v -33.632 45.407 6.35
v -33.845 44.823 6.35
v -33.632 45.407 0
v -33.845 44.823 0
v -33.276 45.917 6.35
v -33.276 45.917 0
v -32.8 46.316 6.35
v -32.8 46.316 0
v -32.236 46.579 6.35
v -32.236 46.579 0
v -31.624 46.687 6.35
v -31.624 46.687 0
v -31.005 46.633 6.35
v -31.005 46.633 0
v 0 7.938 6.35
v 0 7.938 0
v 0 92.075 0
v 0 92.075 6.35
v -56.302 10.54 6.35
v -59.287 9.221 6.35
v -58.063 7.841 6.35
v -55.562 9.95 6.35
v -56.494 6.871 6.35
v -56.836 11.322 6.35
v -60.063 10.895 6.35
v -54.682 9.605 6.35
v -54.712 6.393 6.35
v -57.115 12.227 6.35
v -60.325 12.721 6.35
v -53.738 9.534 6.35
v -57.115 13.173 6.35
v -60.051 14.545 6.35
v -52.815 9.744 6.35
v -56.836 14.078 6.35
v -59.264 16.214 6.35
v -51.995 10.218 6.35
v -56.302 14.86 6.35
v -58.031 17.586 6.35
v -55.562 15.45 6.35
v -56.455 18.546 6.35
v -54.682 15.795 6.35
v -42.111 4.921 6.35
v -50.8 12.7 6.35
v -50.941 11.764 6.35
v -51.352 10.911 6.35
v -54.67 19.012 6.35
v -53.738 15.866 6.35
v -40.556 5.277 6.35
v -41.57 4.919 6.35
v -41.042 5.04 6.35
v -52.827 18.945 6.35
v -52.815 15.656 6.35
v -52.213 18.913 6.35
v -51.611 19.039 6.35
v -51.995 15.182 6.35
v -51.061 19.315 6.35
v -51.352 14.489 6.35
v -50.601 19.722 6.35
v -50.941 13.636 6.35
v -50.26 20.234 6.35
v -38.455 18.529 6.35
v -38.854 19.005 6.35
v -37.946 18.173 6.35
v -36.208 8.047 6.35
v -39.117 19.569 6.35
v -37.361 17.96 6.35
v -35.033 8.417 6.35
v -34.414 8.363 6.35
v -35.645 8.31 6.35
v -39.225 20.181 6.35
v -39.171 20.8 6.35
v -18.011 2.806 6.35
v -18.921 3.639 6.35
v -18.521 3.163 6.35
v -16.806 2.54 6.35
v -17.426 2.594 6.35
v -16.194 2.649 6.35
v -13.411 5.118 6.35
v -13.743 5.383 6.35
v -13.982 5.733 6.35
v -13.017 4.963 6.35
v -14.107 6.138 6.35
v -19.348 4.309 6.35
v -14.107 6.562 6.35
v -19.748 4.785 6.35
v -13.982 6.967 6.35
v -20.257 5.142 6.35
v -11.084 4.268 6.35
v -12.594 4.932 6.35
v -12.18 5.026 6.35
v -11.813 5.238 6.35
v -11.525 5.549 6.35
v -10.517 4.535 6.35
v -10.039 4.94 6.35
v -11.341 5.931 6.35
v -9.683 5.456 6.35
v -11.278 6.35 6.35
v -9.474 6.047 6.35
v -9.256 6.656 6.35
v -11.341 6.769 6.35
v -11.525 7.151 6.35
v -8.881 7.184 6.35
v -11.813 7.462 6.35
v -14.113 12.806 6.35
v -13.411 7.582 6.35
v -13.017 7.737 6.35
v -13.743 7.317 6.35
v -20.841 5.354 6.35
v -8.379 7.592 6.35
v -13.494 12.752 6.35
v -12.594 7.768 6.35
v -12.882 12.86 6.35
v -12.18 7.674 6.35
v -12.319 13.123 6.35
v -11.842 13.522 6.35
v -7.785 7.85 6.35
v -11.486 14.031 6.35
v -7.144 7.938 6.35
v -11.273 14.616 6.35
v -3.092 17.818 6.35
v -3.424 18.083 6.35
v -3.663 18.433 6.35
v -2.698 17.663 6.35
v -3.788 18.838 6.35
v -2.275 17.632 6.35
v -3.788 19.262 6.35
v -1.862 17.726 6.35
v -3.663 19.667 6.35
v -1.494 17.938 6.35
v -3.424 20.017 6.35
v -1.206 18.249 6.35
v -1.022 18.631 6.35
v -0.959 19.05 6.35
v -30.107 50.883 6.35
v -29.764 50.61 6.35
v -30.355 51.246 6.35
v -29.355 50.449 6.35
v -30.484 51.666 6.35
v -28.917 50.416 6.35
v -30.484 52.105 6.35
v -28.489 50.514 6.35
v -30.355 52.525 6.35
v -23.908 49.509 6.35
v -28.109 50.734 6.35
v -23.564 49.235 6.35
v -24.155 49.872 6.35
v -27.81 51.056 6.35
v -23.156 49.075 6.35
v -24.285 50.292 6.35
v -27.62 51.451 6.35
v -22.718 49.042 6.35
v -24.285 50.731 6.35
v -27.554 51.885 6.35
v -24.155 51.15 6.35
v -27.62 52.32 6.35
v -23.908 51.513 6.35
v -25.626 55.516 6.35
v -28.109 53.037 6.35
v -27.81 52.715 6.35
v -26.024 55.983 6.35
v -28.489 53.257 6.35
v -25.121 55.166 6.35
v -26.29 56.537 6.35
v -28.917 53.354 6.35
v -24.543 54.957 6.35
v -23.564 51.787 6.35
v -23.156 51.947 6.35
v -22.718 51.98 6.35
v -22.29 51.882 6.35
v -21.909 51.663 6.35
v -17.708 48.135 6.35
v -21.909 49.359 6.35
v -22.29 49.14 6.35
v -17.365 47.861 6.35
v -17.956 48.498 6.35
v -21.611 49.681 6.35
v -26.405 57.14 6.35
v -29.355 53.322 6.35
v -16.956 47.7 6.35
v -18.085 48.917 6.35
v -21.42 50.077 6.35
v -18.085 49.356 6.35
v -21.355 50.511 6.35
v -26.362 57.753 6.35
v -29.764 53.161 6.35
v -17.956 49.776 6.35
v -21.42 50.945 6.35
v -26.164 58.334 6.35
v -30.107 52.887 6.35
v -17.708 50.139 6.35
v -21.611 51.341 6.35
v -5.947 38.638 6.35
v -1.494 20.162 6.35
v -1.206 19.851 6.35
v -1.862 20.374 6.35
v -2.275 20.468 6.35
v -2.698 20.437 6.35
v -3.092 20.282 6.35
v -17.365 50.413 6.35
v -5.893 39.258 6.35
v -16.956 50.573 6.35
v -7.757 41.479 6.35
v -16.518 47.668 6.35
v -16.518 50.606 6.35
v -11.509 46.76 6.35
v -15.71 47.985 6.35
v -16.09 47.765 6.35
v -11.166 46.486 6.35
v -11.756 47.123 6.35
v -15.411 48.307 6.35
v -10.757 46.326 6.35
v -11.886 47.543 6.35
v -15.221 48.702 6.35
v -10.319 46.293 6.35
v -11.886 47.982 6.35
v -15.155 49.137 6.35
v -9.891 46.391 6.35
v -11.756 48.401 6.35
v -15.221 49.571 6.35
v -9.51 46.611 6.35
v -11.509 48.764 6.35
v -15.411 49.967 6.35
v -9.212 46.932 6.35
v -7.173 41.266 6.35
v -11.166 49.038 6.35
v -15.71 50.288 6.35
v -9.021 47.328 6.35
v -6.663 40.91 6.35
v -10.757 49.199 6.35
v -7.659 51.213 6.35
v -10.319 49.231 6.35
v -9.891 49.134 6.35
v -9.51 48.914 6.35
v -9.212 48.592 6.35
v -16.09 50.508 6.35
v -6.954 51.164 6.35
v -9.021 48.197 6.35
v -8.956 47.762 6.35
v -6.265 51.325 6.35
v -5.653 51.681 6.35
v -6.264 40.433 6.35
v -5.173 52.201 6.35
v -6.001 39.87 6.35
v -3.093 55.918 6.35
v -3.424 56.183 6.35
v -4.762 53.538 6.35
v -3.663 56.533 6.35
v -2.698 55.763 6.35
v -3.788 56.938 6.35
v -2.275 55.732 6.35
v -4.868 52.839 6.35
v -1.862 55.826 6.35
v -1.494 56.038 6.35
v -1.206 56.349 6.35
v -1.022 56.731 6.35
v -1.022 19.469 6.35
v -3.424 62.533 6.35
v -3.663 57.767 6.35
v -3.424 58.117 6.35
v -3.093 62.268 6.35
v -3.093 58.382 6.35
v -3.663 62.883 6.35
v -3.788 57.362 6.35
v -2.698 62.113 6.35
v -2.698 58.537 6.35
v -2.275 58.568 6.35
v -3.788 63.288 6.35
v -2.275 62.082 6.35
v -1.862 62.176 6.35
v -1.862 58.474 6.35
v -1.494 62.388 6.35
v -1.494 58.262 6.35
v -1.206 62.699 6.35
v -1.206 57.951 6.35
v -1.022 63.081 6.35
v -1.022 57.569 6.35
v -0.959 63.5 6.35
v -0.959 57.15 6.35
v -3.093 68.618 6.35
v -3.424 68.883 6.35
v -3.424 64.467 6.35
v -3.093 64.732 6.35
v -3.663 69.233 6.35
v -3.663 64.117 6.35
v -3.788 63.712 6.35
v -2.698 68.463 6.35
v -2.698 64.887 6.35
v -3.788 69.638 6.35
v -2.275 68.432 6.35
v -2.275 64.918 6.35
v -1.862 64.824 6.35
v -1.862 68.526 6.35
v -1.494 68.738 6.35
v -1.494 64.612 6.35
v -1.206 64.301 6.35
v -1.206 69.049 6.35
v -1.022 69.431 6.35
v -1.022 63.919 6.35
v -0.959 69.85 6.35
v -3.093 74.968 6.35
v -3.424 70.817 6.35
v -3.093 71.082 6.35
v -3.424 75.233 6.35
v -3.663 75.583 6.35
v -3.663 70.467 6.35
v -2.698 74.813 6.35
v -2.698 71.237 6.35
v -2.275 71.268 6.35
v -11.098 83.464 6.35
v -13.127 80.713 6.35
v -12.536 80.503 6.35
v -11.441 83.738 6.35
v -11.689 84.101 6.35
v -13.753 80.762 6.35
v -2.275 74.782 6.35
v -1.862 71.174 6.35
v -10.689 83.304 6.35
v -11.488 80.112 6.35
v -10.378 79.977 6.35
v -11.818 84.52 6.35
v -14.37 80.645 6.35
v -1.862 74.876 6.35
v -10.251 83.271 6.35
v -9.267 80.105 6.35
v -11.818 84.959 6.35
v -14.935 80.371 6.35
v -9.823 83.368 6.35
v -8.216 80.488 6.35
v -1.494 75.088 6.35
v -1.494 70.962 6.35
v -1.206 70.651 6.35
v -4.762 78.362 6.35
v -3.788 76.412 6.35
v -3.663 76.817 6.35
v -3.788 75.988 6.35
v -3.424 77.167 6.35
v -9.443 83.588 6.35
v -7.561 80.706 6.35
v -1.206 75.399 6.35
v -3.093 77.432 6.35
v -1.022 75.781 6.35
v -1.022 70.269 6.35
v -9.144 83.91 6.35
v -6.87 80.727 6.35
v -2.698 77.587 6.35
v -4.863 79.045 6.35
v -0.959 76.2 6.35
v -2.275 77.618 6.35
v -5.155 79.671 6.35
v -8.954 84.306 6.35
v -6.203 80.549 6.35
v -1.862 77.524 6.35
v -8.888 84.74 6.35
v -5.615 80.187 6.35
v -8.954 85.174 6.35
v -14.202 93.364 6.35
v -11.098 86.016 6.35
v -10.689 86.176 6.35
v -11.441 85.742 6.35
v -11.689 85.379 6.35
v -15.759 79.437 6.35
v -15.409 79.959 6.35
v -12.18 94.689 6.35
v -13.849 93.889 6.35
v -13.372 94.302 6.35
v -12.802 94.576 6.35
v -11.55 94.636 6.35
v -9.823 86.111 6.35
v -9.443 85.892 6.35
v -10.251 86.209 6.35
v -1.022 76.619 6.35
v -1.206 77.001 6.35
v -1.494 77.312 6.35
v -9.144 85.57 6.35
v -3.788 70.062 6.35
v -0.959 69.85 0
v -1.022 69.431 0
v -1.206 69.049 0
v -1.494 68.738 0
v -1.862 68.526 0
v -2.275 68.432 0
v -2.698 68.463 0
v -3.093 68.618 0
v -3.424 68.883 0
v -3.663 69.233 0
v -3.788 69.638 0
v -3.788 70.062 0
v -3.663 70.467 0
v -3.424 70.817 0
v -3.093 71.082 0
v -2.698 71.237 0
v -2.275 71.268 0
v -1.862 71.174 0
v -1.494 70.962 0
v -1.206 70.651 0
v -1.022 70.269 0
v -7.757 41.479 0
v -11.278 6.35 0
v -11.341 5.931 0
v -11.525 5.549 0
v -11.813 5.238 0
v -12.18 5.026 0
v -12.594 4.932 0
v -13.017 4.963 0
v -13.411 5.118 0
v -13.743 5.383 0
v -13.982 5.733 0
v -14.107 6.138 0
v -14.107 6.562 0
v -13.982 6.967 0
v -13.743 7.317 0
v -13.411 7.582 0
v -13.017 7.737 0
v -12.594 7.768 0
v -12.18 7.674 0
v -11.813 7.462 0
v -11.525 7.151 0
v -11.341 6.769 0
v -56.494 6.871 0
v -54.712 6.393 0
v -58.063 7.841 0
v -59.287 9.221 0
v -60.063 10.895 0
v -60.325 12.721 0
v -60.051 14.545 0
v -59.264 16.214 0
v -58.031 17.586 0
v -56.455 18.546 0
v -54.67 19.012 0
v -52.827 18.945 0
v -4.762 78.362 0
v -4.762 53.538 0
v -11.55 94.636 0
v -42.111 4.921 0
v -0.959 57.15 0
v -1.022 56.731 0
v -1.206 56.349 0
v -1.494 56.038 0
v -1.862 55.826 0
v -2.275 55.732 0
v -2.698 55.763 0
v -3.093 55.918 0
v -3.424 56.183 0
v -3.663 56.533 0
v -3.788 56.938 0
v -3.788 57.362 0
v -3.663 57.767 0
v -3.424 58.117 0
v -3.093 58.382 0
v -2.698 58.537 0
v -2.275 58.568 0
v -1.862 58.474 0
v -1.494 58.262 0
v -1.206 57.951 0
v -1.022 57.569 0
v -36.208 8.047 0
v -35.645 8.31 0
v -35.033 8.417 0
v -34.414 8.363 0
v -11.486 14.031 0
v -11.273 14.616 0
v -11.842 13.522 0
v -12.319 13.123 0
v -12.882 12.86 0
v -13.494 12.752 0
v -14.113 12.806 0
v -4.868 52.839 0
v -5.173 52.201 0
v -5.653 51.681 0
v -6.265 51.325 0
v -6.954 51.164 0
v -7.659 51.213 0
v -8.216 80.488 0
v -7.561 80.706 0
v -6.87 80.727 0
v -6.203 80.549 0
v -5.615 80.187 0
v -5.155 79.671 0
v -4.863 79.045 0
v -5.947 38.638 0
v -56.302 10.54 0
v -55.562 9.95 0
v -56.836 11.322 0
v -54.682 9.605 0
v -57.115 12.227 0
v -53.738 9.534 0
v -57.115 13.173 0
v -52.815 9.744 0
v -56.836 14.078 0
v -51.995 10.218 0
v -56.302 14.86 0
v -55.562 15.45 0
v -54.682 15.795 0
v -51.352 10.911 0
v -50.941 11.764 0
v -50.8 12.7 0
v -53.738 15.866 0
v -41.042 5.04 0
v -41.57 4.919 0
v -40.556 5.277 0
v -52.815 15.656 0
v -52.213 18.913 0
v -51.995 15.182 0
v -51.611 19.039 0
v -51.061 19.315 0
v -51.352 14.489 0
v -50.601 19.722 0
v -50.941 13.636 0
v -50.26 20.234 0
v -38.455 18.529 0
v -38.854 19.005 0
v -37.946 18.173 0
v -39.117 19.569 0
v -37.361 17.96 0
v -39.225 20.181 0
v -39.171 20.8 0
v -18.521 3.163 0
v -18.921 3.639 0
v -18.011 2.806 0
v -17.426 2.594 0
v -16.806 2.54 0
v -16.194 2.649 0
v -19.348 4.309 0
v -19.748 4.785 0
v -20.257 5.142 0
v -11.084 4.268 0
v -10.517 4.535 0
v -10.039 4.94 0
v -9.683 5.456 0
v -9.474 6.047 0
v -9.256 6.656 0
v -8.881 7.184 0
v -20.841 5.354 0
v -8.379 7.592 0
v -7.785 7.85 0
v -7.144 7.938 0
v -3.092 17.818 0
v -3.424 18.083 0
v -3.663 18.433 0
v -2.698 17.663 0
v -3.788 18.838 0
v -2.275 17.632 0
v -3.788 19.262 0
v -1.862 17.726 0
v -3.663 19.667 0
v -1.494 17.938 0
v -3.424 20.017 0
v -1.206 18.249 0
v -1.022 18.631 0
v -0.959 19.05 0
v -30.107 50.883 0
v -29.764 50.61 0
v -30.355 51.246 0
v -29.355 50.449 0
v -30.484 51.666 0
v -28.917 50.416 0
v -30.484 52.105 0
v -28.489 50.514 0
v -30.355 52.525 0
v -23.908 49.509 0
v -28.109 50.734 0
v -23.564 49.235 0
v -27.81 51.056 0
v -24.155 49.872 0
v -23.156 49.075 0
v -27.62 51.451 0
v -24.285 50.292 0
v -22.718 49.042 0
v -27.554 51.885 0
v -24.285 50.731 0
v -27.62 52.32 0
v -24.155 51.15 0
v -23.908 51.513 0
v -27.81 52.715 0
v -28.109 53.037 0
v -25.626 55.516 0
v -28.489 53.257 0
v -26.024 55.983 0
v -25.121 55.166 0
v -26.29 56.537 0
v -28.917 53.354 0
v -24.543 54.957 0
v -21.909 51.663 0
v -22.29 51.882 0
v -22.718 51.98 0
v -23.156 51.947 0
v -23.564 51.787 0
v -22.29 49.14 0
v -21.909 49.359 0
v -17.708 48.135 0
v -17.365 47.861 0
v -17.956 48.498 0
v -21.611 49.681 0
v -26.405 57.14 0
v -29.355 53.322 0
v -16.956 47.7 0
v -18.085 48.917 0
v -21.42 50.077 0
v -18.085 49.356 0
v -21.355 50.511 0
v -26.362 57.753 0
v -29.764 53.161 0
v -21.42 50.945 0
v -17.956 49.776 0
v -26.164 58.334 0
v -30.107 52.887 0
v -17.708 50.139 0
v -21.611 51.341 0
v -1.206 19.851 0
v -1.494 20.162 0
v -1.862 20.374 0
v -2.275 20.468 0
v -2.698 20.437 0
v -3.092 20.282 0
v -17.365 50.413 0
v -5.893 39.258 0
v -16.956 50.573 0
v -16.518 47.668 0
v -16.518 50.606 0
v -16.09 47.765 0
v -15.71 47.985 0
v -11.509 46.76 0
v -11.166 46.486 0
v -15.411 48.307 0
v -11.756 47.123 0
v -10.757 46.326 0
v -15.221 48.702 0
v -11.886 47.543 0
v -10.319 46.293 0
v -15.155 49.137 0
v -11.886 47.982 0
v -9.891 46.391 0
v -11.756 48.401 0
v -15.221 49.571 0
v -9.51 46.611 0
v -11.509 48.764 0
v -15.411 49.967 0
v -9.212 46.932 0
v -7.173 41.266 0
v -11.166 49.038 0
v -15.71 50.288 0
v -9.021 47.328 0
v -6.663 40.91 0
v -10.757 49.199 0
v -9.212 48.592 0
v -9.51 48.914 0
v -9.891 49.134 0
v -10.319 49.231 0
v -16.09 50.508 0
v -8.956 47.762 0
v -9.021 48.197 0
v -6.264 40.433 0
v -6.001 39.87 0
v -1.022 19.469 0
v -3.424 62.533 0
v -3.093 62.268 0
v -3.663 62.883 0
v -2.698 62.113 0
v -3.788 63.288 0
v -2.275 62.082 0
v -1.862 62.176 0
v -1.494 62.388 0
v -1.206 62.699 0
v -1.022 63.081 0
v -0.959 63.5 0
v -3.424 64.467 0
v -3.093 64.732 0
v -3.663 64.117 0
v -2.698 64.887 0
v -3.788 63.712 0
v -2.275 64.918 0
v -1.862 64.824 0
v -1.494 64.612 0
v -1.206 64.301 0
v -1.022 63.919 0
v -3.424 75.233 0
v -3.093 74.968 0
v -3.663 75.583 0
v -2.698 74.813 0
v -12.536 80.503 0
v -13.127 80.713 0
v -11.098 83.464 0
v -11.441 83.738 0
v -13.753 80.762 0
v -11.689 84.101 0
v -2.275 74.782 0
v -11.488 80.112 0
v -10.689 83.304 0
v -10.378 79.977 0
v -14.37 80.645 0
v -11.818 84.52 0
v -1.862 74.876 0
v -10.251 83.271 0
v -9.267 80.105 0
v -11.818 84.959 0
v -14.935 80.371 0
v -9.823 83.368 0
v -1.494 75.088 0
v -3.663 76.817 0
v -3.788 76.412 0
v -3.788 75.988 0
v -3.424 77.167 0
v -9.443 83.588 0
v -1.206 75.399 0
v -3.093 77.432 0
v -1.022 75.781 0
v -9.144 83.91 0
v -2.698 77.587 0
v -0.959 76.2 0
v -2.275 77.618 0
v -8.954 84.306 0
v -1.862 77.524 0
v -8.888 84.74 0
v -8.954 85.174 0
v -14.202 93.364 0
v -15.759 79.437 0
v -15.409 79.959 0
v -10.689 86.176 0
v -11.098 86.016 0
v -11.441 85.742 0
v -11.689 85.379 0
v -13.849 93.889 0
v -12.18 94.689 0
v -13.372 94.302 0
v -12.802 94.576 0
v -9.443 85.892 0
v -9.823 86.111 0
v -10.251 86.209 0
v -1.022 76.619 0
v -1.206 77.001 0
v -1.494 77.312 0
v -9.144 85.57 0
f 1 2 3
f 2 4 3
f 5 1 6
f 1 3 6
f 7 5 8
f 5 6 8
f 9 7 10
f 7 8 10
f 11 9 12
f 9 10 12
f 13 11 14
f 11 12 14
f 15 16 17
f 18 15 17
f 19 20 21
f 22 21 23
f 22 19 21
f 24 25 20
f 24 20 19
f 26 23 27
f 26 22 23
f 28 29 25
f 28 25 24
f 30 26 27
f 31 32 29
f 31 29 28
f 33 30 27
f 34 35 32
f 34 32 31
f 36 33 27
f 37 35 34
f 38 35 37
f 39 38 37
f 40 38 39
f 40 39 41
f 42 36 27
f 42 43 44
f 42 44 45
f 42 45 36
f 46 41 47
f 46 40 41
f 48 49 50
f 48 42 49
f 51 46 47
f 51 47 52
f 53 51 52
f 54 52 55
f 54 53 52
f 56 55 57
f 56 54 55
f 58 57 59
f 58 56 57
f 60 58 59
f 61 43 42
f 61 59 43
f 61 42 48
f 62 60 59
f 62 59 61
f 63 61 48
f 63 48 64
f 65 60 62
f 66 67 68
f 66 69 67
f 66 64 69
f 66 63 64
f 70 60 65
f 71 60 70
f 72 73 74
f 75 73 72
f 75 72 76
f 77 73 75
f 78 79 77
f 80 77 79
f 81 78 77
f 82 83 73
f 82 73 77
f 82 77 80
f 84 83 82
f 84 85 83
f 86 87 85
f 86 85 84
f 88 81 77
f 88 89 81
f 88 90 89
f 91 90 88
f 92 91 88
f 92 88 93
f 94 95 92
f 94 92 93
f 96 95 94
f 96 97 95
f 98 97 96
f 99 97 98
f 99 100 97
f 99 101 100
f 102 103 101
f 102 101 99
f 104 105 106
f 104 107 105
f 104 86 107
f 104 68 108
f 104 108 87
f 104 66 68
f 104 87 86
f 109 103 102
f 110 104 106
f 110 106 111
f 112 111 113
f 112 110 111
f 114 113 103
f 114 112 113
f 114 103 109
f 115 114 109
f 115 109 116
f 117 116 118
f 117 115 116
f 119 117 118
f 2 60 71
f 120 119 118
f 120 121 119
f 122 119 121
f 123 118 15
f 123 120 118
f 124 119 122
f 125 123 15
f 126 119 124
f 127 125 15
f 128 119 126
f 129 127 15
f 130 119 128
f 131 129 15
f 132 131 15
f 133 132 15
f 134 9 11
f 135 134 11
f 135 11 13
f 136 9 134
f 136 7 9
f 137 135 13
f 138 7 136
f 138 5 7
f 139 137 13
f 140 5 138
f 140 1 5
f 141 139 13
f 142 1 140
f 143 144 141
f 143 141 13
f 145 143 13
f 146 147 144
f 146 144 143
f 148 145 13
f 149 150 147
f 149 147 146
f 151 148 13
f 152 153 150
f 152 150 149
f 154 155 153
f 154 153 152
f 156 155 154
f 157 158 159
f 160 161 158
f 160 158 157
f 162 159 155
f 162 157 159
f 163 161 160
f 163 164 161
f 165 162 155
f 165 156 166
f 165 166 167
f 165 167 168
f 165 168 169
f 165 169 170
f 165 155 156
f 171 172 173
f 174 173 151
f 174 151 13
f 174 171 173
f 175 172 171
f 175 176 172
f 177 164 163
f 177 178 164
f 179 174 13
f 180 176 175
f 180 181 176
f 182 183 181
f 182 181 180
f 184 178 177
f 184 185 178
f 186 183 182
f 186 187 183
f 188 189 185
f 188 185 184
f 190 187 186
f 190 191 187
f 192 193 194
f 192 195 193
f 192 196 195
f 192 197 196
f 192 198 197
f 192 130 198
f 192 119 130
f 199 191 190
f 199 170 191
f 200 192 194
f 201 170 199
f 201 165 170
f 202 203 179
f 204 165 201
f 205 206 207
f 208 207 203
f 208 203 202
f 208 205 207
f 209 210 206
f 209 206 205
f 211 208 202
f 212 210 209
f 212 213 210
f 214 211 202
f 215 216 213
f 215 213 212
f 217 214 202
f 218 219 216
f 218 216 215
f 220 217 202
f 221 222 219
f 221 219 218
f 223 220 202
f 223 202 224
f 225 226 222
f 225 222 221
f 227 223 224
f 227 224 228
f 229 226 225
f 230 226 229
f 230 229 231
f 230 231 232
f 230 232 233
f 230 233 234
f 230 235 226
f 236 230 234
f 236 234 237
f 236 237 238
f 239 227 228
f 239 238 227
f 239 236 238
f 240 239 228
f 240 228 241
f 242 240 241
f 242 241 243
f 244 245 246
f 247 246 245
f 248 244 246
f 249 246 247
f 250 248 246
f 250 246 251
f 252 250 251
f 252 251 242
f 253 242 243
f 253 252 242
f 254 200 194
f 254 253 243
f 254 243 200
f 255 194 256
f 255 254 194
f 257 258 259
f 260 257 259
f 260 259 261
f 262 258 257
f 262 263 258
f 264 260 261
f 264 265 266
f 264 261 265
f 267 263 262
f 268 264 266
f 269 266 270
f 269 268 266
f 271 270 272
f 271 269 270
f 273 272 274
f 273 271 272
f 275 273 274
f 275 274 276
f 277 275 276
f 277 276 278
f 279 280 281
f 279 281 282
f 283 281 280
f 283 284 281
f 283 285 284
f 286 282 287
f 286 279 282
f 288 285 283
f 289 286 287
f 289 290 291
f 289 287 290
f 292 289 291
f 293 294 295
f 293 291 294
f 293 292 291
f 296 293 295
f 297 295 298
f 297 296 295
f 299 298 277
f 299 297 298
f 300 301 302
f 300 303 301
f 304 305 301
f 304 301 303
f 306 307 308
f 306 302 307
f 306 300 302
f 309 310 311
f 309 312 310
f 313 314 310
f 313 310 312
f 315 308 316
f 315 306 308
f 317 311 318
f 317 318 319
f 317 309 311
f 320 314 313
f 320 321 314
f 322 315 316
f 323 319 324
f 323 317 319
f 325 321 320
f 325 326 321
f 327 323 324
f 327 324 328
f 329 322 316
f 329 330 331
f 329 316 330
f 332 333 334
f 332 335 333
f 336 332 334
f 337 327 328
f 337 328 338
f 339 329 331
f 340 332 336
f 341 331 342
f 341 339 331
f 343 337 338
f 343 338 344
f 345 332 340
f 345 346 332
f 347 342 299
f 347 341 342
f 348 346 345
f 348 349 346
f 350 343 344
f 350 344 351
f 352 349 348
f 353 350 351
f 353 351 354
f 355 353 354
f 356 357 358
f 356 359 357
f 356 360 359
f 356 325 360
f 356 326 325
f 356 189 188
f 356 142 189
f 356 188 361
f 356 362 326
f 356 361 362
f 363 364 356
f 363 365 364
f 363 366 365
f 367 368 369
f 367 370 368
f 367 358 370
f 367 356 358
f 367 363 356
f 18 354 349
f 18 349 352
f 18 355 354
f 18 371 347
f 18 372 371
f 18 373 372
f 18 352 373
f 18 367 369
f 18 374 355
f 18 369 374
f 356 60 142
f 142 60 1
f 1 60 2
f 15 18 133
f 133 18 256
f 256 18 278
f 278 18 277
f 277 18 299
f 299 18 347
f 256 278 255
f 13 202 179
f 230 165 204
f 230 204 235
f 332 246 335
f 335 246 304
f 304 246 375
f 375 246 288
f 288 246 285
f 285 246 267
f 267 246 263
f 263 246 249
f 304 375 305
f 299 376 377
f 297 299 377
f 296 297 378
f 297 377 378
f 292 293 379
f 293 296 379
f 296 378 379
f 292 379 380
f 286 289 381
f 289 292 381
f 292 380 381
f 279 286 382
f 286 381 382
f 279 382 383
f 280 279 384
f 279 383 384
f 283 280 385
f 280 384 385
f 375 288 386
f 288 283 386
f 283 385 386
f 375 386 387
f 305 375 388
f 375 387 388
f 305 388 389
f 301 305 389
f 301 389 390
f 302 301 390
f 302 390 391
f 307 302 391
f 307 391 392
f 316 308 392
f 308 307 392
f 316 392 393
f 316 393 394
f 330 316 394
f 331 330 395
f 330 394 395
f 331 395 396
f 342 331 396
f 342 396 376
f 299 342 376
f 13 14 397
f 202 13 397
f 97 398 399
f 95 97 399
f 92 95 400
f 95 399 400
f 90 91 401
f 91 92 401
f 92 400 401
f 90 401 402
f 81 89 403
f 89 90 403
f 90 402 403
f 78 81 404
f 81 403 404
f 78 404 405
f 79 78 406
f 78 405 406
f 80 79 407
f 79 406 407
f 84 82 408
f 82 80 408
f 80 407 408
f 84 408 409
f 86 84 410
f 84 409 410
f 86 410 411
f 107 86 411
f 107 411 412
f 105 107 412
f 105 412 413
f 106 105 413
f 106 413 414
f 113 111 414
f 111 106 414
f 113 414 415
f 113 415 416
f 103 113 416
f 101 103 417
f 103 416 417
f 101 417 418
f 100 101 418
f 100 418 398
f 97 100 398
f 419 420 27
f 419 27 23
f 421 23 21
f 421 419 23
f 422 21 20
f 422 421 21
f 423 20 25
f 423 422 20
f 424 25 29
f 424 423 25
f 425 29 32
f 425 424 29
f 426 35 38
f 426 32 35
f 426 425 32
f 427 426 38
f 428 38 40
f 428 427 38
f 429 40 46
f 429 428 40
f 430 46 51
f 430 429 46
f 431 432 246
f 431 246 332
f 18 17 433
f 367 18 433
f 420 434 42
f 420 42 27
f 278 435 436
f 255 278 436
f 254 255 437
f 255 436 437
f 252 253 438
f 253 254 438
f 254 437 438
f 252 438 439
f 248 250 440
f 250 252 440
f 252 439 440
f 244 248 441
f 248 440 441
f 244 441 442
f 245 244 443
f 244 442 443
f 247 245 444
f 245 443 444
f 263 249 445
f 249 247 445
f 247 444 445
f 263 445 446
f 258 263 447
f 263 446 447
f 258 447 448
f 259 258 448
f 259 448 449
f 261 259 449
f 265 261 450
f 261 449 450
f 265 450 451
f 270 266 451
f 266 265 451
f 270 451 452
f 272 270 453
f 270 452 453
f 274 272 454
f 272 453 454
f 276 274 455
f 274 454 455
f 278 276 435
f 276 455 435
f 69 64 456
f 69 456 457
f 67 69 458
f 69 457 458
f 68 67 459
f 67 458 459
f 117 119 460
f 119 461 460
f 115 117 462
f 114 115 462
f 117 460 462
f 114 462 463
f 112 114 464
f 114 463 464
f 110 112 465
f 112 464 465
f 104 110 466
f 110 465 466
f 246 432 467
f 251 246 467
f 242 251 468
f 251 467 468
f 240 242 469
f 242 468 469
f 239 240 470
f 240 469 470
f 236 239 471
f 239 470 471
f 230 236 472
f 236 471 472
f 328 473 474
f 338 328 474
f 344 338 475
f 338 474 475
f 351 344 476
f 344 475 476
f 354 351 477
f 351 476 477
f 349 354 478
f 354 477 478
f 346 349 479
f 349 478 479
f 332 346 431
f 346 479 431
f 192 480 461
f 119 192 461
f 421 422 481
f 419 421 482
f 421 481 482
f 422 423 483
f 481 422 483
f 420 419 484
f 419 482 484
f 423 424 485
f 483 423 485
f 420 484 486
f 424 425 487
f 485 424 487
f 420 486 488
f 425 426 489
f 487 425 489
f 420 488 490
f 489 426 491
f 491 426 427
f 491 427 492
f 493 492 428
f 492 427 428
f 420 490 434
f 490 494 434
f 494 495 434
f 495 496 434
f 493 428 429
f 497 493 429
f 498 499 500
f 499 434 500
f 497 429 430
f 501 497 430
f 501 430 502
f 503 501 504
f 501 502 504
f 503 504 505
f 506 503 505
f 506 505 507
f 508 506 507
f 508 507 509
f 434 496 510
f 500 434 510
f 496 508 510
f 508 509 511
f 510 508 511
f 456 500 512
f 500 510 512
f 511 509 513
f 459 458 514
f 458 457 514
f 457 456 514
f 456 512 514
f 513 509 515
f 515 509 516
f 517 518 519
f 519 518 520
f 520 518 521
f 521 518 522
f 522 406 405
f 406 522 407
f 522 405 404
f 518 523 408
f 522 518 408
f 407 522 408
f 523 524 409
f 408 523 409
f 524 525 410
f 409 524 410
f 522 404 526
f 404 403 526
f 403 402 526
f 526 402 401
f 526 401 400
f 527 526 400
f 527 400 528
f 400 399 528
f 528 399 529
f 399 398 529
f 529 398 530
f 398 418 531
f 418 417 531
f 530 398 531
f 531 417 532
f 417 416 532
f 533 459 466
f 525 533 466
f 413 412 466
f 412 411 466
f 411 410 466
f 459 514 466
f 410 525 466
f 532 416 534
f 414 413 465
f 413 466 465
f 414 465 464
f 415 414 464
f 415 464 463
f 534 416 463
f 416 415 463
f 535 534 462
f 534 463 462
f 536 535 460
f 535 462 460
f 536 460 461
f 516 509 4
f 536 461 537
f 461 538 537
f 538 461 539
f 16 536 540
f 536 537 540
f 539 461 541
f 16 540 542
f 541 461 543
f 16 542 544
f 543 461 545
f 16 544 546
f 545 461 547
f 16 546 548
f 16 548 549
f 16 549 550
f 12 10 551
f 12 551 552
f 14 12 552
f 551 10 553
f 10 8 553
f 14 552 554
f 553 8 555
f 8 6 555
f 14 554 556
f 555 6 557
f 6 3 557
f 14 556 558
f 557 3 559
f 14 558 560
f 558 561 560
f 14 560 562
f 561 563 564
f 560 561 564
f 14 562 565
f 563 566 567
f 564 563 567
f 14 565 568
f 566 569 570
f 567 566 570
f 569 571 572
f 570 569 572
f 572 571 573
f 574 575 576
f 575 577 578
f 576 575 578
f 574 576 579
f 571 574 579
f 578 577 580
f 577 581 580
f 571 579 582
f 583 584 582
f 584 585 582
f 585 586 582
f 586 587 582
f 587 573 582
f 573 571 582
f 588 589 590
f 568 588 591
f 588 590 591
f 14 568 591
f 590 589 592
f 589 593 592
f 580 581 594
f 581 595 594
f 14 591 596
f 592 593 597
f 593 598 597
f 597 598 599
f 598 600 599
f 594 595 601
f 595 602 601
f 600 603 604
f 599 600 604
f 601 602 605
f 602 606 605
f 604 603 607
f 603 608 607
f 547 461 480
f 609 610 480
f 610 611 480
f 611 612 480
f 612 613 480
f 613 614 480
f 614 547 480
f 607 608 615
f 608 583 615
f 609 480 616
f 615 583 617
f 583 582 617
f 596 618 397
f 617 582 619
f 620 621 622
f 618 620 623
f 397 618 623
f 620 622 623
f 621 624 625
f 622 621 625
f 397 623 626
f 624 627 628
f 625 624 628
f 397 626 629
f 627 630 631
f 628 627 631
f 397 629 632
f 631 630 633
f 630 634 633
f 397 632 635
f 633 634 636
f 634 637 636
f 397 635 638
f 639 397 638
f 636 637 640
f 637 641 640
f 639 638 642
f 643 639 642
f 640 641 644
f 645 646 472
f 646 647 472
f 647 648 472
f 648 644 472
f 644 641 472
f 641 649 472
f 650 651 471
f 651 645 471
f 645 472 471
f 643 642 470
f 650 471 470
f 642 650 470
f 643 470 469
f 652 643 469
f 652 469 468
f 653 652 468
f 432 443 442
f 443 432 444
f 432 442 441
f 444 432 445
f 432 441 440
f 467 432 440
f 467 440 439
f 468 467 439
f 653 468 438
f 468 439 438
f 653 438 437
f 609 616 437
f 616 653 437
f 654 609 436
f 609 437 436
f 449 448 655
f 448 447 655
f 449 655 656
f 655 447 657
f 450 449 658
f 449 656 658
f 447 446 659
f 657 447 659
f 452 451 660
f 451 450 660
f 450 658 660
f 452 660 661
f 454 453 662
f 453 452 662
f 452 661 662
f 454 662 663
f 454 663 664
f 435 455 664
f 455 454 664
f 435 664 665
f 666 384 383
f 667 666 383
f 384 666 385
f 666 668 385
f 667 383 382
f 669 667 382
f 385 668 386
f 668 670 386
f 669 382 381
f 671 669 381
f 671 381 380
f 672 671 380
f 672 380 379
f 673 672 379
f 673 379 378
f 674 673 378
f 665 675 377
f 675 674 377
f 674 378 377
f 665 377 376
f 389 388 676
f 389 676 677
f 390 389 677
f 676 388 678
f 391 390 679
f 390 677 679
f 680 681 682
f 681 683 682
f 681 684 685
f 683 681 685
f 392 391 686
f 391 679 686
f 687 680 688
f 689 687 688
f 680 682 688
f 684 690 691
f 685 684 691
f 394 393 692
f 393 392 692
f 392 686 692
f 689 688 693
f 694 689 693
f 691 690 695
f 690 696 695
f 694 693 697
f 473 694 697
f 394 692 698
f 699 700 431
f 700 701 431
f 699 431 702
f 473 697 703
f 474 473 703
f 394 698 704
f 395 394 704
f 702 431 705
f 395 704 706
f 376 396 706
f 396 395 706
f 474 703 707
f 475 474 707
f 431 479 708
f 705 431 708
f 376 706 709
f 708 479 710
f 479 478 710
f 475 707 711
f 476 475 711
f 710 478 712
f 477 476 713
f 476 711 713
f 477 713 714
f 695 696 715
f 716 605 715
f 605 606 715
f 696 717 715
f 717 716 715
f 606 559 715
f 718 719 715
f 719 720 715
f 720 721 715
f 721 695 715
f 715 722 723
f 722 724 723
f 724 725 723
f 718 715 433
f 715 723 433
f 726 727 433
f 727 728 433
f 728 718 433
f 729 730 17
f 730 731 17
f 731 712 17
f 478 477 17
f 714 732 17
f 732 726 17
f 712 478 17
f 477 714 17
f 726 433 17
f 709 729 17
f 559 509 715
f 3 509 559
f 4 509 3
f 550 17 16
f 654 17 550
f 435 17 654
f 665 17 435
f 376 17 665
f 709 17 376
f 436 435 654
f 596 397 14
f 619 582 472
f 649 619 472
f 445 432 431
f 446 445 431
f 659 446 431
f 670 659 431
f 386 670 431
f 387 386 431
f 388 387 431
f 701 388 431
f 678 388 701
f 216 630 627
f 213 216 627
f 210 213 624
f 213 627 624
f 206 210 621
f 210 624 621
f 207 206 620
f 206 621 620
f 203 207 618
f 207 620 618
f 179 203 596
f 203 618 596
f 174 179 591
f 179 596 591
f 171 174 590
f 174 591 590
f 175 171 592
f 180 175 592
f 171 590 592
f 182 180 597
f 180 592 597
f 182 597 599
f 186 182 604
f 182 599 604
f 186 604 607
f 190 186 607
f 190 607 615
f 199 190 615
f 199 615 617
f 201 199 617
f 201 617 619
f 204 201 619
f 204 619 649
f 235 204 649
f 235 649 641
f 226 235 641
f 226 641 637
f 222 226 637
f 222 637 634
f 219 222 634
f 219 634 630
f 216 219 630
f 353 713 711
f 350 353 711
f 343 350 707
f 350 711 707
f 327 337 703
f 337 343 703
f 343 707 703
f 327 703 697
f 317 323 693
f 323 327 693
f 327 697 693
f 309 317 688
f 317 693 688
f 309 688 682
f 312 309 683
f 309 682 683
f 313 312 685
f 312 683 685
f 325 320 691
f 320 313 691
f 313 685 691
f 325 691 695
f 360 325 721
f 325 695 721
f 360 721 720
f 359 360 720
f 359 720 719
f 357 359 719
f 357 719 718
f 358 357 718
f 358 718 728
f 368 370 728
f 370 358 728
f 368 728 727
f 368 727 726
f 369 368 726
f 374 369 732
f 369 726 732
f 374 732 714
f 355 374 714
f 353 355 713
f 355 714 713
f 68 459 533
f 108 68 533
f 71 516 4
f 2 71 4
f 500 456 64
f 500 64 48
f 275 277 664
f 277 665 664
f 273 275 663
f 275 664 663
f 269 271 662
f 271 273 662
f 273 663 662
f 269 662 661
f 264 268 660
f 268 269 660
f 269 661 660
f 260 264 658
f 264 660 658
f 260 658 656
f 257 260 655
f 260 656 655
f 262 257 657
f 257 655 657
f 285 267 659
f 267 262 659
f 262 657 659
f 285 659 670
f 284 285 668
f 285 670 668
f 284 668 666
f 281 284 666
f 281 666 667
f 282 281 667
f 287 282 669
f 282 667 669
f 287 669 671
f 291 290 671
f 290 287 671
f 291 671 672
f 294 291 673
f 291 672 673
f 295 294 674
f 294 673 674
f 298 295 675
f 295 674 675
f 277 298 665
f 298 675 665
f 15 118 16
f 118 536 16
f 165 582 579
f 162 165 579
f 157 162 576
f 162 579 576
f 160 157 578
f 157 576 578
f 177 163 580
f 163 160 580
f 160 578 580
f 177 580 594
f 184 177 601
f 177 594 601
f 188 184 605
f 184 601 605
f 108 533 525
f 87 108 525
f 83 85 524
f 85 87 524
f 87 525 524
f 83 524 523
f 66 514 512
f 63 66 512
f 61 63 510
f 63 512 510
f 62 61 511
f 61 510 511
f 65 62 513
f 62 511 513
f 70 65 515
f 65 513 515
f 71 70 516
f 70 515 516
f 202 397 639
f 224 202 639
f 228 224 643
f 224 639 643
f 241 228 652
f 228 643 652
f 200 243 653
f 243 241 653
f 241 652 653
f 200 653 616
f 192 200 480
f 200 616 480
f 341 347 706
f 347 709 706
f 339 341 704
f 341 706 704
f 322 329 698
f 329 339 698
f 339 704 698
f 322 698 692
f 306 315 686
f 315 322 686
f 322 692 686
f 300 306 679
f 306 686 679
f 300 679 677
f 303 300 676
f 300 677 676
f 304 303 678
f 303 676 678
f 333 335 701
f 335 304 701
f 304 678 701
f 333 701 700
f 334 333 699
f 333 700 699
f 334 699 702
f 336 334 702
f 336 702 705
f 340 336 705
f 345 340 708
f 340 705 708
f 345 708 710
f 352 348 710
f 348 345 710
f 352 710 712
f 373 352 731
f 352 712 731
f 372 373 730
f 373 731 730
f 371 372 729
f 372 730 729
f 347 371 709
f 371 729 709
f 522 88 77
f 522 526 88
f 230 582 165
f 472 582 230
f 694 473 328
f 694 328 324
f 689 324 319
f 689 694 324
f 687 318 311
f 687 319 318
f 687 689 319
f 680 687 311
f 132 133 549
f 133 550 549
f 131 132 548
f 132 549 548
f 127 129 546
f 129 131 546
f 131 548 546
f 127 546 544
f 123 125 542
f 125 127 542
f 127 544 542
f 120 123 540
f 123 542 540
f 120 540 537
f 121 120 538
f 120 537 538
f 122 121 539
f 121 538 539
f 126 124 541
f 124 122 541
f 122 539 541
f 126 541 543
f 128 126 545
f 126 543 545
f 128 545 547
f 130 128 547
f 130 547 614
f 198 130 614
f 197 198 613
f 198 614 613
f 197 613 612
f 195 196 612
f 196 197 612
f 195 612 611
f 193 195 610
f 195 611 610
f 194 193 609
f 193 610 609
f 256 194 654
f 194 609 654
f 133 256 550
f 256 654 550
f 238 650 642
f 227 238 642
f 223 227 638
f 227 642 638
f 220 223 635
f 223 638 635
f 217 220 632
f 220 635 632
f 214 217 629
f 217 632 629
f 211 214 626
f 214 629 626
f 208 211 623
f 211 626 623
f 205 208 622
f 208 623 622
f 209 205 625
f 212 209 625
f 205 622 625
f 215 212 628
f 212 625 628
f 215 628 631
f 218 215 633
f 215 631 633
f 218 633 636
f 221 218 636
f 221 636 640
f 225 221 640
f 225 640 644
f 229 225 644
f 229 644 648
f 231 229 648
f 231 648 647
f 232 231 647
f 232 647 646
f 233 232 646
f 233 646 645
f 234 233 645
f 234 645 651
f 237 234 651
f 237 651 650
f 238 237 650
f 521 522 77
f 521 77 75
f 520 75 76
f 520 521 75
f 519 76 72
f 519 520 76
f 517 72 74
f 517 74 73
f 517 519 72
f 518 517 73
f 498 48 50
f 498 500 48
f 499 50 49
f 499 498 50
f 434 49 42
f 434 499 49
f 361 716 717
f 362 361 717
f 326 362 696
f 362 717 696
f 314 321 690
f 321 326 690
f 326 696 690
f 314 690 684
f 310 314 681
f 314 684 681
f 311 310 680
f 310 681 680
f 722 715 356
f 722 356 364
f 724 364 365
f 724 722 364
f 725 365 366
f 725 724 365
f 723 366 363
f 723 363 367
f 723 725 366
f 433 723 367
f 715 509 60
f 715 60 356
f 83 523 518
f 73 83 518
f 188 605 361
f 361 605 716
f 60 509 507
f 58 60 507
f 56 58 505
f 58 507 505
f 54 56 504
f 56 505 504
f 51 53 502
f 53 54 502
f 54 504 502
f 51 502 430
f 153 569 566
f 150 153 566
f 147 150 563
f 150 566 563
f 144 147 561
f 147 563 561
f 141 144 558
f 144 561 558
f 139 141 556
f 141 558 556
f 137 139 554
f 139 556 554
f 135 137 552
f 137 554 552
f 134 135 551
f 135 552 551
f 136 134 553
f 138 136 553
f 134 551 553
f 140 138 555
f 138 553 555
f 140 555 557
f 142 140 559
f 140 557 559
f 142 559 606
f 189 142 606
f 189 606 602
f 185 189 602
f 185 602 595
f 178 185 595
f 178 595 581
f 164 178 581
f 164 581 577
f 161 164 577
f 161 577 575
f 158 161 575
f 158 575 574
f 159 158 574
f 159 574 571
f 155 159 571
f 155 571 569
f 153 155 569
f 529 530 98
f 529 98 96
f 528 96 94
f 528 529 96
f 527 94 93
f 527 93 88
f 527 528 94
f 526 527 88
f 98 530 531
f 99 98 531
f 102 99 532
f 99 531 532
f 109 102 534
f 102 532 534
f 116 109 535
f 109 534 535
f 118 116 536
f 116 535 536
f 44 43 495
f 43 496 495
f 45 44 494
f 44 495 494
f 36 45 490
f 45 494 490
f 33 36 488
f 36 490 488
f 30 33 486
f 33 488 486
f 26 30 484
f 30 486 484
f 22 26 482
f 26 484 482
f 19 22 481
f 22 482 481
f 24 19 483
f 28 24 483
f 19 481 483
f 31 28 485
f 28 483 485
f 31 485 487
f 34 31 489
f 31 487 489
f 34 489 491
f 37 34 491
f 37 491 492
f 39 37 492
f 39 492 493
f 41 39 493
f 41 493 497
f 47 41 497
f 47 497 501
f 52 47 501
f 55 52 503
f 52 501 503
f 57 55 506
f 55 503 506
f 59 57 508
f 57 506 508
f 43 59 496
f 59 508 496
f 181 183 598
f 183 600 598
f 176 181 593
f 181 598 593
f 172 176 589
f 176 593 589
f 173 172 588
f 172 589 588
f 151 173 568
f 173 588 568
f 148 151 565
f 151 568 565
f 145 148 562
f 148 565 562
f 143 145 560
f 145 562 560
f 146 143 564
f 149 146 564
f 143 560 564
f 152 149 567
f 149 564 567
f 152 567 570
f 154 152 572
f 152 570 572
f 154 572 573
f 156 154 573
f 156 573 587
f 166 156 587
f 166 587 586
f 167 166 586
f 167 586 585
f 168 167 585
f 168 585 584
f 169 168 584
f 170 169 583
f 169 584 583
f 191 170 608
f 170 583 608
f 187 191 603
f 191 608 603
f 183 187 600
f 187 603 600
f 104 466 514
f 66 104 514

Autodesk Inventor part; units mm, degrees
ref_plane "YZ Plane" through (0, 0, 0) normal (1, 0, 0) x (0, 1, 0)
ref_plane "XZ Plane" through (0, 0, 0) normal (0, 1, 0) x (-1, 0, 0)
ref_plane "XY Plane" through (0, 0, 0) normal (0, 0, 1) x (1, 0, 0)
sketch "Sketch1" plane through (0, 0, 0) normal (0, 0, 1) x (1, 0, 0)
  line L0 (0, 0) -> (0, 136.525)
  line L1 (-11.7886, 12.2907) -> (-39.6863, 18.4755)
  line L2 (-39.6863, 18.4755) -> (-33.3297, 47.1481)
  line L3 (-33.3297, 47.1481) -> (-5.432, 40.9633)
  line L4 (-5.432, 40.9633) -> (-11.7886, 12.2907)
  line L5 (-39.6863, 18.4755) -> (-5.432, 40.9633) construction
  line L6 (-33.3297, 47.1481) -> (-11.7886, 12.2907) construction
  circle A0 centre (-53.975, 12.7) radius 3.175
  circle A1 centre (-53.975, 12.7) radius 6.35
  line L7 (0, 0) -> (-54.712, 6.3929)
  line L8 (-59.6703, 15.5082) -> (0, 136.525)
  line L9 (-27.1302, 45.7737) -> (-37.4529, 28.5497)
  line L10 (-11.6315, 42.3377) -> (-9.5552, 22.3649)
  line L11 (-19.3809, 44.0557) -> (-25.7374, 15.3831) construction
  line L12 (0, 92.075) -> (-19.7574, 96.4551)
  line L13 (-35.3766, 8.5768) -> (-19.8779, 5.1408)
  line L14 (-19.8779, 5.1408) -> (-21.2523, -1.0586)
  line L15 (-21.2523, -1.0586) -> (-36.751, 2.3773)
  line L16 (-36.751, 2.3773) -> (-35.3766, 8.5768)
  line L17 (-35.3766, 8.5768) -> (-41.27, 4.8223)
  line L18 (-19.8779, 5.1408) -> (-17.9381, 2.096)
  line L19 (-5.432, 40.9633) -> (-33.3297, 47.1481)
  line L20 (-33.3297, 47.1481) -> (-32.2475, 52.0296)
  line L21 (-32.2475, 52.0296) -> (-4.3498, 45.8448)
  line L22 (-4.3498, 45.8448) -> (-5.432, 40.9633)
  line L23 (-53.2878, 15.7997) -> (-53.975, 12.7) construction
  line L24 (-53.975, 12.7) -> (-57.0747, 13.3872) construction
  line L25 (-27.6272, 6.8588) -> (-34.4992, -24.1386) construction
  line L26 (-31.8676, 50.076) -> (-5.5198, 44.2349)
  line L27 (-5.5198, 44.2349) -> (-4.489, 48.8845)
  line L28 (-4.489, 48.8845) -> (-30.8368, 54.7256)
  line L29 (-30.8368, 54.7256) -> (-31.8676, 50.076)
  line L30 (-31.3522, 52.4008) -> (-5.0044, 46.5597) construction
  circle A2 centre (-29.0274, 51.8854) radius 1.4732
  circle A3 centre (-22.8279, 50.5111) radius 1.4732
  circle A4 centre (-16.6284, 49.1367) radius 1.4732
  circle A5 centre (-10.4289, 47.7623) radius 1.4732
  circle A6 centre (-10.3614, 84.7398) radius 1.4732
  line L31 (-53.975, 12.7) -> (-13.3751, 95.0402)
  line L32 (-32.2923, 56.6744) -> (0, 49.5153)
  circle A7 centre (-10.3614, 84.7398) radius 4.7625
  line L33 (-4.7625, 50.5712) -> (-4.7625, 93.1308)
  line L34 (-27.5056, 55.6132) -> (-14.3936, 82.2055)
  line L35 (-5.6003, 84.6261) -> (-4.7625, 84.4403)
  circle A8 centre (-12.7, 6.35) radius 1.4224
  line L36 (-9.525, 4.7625) -> (-17.9381, 2.096)
  line L37 (-9.525, 7.9375) -> (-9.525, 4.7625)
  line L38 (-9.525, 7.9375) -> (0, 7.9375)
  line L39 (0, 13.4938) -> (-4.7625, 13.4937) construction
  line L40 (-4.7625, 13.4937) -> (-4.7625, 24.6063) construction
  line L41 (-4.7625, 24.6063) -> (0, 24.6063) construction
  line L42 (0, 24.6063) -> (0, 13.4938) construction
  line L43 (-4.7625, 19.05) -> (0, 19.05) construction
  circle A9 centre (-2.3812, 19.05) radius 1.4224
  line L44 (-4.7625, 57.15) -> (0, 57.15) construction
  circle A10 centre (-2.3813, 57.15) radius 1.4224
  circle A11 centre (-2.3813, 63.5) radius 1.4224
  circle A12 centre (-2.3813, 69.85) radius 1.4224
  circle A13 centre (-2.3813, 76.2) radius 1.4224
  line L45 (-34.4992, -24.1386) -> (-14.5705, 65.7539) construction
  line L46 (-14.5705, 65.7539) -> (-17.3193, 53.3549) construction
  line L47 (-17.3193, 53.3549) -> (-11.1198, 51.9805) construction
  line L48 (-11.1198, 51.9805) -> (-8.371, 64.3795) construction
  line L49 (-8.371, 64.3795) -> (-14.5705, 65.7539) construction
  line L50 (-14.2195, 52.6677) -> (-11.4708, 65.0667) construction
  line L51 (-15.9449, 59.5544) -> (-9.7454, 58.18) construction
  line L52 (-17.3193, 53.3549) -> (-9.7454, 58.18) construction
  line L53 (-14.5705, 65.7539) -> (-9.7454, 58.18) construction
  circle A14 centre (-13.5323, 55.7675) radius 1.4224
  circle A15 centre (-12.1579, 61.967) radius 1.4224
  line L54 (-14.2195, 52.6677) -> (-12.1579, 61.967) construction
  line L55 (-11.1198, 51.9805) -> (-9.0582, 61.2798)
  line L56 (-15.2577, 62.6542) -> (-17.3193, 53.3549)
  arc A16 (-17.3193, 53.3549) -> (-11.1198, 51.9805) centre (-14.2195, 52.6677) ccw construction
  arc A17 (-9.0582, 61.2798) -> (-15.2577, 62.6542) centre (-12.1579, 61.967) ccw
  point P0 (-22.5591, 29.7194)
  point P1 (-20.4869, 2.3938)
  point P2 (-36.3367, 4.2458)
  point P3 (-51.1668, 18.3953)
  point P4 (-4.7625, 7.9375)
  point P5 (-22.5591, 29.7194)
  point P6 (-13.1887, 57.3173)
  dimension "d13" = 136.525
  dimension "d14" = 29.3687
  dimension "d15" = 28.575
  dimension "d16" = 12.5
  dimension "d17" = 6.35
  dimension "d19" = 53.975
  dimension "d22" = 12.7
  dimension "d23" = 7.9375
  dimension "d24" = 19.05
  dimension "d26" = 102.5
  dimension "d29" = 6.35
  dimension "d31" = 7.9375
  dimension "d34" = 5
  dimension "d35" = 26.9875
  dimension "d38" = 31.75
  dimension "d40" = 26.9875
  dimension "d41" = 4.7625
  dimension "d42" = 2.9464
  dimension "d43" = 2.3813
  dimension "d46" = 6.35
  dimension "d51" = 2.9464
  dimension "d52" = 79.7719
  dimension "d53" = 6.35
  dimension "d54" = 9.525
  dimension "d55" = 4.7625
  dimension "d56" = 4.7625
  dimension "d60" = 12.7
  dimension "d61" = 3.175
  dimension "d66" = 2.8448
  dimension "d67" = 12.7
  dimension "d72" = 8.7312
  dimension "d75" = 34.925
  dimension "d80" = 92.075
  dimension "d81" = 6.35
  dimension "d82" = 7.9375
  dimension "d83" = 3.175
  dimension "d84" = 9.525
  dimension "d85" = 4.7625
  dimension "d86" = 11.1125
  dimension "d87" = 2.8448
  dimension "d88" = 19.05
  dimension "d89" = 2.8448
  dimension "d90" = 38.1
  dimension "d93" = 6.35
  dimension "d98" = 92.075
  dimension "d99" = 12.7
  dimension "d100" = 6.35
  dimension "d101" = 2.8448
  dimension "d102" = 2.8448
extrude "Extrusion1" add sketch "Sketch1" along normal blind 6.35 contours L38 L37 L36 L18 L13 L17 L7 A1 L31 L32 L0 | L32 L33 L12 L0 | L33 L35 A7 L34 L32 L31 L12 | A7 | A1 | L3 L20 L21 L29 L26 L27 L22 | L27 L26 L29 L21 A2 A3 A4 A5 | L21 A5 A4 A3 A2 L29 L28 L27
fillet "Fillet1" radius 2.3813 17 edges at (-39.6863, 18.4755, 3.175) (-11.7886, 12.2907, 3.175) (-51.1668, 18.3953, 3.175) (-19.8779, 5.1408, 3.175) (-35.3766, 8.5768, 3.175) (-41.27, 4.8223, 3.175) (-13.3751, 95.0402, 3.175) (-14.3936, 82.2055, 3.175) (-5.6003, 84.6261, 3.175) (-4.7625, 84.4403, 3.175) (-27.5056, 55.6132, 3.175) (-4.7625, 50.5712, 3.175) (-33.3297, 47.1481, 3.175) (-5.432, 40.9633, 3.175) (-17.9381, 2.096, 3.175) (-9.525, 7.9375, 3.175) (-9.525, 4.7625, 3.175)
equation "\"d56\" = d55"
properties part number "Uprights" material "Aluminum 6061"
